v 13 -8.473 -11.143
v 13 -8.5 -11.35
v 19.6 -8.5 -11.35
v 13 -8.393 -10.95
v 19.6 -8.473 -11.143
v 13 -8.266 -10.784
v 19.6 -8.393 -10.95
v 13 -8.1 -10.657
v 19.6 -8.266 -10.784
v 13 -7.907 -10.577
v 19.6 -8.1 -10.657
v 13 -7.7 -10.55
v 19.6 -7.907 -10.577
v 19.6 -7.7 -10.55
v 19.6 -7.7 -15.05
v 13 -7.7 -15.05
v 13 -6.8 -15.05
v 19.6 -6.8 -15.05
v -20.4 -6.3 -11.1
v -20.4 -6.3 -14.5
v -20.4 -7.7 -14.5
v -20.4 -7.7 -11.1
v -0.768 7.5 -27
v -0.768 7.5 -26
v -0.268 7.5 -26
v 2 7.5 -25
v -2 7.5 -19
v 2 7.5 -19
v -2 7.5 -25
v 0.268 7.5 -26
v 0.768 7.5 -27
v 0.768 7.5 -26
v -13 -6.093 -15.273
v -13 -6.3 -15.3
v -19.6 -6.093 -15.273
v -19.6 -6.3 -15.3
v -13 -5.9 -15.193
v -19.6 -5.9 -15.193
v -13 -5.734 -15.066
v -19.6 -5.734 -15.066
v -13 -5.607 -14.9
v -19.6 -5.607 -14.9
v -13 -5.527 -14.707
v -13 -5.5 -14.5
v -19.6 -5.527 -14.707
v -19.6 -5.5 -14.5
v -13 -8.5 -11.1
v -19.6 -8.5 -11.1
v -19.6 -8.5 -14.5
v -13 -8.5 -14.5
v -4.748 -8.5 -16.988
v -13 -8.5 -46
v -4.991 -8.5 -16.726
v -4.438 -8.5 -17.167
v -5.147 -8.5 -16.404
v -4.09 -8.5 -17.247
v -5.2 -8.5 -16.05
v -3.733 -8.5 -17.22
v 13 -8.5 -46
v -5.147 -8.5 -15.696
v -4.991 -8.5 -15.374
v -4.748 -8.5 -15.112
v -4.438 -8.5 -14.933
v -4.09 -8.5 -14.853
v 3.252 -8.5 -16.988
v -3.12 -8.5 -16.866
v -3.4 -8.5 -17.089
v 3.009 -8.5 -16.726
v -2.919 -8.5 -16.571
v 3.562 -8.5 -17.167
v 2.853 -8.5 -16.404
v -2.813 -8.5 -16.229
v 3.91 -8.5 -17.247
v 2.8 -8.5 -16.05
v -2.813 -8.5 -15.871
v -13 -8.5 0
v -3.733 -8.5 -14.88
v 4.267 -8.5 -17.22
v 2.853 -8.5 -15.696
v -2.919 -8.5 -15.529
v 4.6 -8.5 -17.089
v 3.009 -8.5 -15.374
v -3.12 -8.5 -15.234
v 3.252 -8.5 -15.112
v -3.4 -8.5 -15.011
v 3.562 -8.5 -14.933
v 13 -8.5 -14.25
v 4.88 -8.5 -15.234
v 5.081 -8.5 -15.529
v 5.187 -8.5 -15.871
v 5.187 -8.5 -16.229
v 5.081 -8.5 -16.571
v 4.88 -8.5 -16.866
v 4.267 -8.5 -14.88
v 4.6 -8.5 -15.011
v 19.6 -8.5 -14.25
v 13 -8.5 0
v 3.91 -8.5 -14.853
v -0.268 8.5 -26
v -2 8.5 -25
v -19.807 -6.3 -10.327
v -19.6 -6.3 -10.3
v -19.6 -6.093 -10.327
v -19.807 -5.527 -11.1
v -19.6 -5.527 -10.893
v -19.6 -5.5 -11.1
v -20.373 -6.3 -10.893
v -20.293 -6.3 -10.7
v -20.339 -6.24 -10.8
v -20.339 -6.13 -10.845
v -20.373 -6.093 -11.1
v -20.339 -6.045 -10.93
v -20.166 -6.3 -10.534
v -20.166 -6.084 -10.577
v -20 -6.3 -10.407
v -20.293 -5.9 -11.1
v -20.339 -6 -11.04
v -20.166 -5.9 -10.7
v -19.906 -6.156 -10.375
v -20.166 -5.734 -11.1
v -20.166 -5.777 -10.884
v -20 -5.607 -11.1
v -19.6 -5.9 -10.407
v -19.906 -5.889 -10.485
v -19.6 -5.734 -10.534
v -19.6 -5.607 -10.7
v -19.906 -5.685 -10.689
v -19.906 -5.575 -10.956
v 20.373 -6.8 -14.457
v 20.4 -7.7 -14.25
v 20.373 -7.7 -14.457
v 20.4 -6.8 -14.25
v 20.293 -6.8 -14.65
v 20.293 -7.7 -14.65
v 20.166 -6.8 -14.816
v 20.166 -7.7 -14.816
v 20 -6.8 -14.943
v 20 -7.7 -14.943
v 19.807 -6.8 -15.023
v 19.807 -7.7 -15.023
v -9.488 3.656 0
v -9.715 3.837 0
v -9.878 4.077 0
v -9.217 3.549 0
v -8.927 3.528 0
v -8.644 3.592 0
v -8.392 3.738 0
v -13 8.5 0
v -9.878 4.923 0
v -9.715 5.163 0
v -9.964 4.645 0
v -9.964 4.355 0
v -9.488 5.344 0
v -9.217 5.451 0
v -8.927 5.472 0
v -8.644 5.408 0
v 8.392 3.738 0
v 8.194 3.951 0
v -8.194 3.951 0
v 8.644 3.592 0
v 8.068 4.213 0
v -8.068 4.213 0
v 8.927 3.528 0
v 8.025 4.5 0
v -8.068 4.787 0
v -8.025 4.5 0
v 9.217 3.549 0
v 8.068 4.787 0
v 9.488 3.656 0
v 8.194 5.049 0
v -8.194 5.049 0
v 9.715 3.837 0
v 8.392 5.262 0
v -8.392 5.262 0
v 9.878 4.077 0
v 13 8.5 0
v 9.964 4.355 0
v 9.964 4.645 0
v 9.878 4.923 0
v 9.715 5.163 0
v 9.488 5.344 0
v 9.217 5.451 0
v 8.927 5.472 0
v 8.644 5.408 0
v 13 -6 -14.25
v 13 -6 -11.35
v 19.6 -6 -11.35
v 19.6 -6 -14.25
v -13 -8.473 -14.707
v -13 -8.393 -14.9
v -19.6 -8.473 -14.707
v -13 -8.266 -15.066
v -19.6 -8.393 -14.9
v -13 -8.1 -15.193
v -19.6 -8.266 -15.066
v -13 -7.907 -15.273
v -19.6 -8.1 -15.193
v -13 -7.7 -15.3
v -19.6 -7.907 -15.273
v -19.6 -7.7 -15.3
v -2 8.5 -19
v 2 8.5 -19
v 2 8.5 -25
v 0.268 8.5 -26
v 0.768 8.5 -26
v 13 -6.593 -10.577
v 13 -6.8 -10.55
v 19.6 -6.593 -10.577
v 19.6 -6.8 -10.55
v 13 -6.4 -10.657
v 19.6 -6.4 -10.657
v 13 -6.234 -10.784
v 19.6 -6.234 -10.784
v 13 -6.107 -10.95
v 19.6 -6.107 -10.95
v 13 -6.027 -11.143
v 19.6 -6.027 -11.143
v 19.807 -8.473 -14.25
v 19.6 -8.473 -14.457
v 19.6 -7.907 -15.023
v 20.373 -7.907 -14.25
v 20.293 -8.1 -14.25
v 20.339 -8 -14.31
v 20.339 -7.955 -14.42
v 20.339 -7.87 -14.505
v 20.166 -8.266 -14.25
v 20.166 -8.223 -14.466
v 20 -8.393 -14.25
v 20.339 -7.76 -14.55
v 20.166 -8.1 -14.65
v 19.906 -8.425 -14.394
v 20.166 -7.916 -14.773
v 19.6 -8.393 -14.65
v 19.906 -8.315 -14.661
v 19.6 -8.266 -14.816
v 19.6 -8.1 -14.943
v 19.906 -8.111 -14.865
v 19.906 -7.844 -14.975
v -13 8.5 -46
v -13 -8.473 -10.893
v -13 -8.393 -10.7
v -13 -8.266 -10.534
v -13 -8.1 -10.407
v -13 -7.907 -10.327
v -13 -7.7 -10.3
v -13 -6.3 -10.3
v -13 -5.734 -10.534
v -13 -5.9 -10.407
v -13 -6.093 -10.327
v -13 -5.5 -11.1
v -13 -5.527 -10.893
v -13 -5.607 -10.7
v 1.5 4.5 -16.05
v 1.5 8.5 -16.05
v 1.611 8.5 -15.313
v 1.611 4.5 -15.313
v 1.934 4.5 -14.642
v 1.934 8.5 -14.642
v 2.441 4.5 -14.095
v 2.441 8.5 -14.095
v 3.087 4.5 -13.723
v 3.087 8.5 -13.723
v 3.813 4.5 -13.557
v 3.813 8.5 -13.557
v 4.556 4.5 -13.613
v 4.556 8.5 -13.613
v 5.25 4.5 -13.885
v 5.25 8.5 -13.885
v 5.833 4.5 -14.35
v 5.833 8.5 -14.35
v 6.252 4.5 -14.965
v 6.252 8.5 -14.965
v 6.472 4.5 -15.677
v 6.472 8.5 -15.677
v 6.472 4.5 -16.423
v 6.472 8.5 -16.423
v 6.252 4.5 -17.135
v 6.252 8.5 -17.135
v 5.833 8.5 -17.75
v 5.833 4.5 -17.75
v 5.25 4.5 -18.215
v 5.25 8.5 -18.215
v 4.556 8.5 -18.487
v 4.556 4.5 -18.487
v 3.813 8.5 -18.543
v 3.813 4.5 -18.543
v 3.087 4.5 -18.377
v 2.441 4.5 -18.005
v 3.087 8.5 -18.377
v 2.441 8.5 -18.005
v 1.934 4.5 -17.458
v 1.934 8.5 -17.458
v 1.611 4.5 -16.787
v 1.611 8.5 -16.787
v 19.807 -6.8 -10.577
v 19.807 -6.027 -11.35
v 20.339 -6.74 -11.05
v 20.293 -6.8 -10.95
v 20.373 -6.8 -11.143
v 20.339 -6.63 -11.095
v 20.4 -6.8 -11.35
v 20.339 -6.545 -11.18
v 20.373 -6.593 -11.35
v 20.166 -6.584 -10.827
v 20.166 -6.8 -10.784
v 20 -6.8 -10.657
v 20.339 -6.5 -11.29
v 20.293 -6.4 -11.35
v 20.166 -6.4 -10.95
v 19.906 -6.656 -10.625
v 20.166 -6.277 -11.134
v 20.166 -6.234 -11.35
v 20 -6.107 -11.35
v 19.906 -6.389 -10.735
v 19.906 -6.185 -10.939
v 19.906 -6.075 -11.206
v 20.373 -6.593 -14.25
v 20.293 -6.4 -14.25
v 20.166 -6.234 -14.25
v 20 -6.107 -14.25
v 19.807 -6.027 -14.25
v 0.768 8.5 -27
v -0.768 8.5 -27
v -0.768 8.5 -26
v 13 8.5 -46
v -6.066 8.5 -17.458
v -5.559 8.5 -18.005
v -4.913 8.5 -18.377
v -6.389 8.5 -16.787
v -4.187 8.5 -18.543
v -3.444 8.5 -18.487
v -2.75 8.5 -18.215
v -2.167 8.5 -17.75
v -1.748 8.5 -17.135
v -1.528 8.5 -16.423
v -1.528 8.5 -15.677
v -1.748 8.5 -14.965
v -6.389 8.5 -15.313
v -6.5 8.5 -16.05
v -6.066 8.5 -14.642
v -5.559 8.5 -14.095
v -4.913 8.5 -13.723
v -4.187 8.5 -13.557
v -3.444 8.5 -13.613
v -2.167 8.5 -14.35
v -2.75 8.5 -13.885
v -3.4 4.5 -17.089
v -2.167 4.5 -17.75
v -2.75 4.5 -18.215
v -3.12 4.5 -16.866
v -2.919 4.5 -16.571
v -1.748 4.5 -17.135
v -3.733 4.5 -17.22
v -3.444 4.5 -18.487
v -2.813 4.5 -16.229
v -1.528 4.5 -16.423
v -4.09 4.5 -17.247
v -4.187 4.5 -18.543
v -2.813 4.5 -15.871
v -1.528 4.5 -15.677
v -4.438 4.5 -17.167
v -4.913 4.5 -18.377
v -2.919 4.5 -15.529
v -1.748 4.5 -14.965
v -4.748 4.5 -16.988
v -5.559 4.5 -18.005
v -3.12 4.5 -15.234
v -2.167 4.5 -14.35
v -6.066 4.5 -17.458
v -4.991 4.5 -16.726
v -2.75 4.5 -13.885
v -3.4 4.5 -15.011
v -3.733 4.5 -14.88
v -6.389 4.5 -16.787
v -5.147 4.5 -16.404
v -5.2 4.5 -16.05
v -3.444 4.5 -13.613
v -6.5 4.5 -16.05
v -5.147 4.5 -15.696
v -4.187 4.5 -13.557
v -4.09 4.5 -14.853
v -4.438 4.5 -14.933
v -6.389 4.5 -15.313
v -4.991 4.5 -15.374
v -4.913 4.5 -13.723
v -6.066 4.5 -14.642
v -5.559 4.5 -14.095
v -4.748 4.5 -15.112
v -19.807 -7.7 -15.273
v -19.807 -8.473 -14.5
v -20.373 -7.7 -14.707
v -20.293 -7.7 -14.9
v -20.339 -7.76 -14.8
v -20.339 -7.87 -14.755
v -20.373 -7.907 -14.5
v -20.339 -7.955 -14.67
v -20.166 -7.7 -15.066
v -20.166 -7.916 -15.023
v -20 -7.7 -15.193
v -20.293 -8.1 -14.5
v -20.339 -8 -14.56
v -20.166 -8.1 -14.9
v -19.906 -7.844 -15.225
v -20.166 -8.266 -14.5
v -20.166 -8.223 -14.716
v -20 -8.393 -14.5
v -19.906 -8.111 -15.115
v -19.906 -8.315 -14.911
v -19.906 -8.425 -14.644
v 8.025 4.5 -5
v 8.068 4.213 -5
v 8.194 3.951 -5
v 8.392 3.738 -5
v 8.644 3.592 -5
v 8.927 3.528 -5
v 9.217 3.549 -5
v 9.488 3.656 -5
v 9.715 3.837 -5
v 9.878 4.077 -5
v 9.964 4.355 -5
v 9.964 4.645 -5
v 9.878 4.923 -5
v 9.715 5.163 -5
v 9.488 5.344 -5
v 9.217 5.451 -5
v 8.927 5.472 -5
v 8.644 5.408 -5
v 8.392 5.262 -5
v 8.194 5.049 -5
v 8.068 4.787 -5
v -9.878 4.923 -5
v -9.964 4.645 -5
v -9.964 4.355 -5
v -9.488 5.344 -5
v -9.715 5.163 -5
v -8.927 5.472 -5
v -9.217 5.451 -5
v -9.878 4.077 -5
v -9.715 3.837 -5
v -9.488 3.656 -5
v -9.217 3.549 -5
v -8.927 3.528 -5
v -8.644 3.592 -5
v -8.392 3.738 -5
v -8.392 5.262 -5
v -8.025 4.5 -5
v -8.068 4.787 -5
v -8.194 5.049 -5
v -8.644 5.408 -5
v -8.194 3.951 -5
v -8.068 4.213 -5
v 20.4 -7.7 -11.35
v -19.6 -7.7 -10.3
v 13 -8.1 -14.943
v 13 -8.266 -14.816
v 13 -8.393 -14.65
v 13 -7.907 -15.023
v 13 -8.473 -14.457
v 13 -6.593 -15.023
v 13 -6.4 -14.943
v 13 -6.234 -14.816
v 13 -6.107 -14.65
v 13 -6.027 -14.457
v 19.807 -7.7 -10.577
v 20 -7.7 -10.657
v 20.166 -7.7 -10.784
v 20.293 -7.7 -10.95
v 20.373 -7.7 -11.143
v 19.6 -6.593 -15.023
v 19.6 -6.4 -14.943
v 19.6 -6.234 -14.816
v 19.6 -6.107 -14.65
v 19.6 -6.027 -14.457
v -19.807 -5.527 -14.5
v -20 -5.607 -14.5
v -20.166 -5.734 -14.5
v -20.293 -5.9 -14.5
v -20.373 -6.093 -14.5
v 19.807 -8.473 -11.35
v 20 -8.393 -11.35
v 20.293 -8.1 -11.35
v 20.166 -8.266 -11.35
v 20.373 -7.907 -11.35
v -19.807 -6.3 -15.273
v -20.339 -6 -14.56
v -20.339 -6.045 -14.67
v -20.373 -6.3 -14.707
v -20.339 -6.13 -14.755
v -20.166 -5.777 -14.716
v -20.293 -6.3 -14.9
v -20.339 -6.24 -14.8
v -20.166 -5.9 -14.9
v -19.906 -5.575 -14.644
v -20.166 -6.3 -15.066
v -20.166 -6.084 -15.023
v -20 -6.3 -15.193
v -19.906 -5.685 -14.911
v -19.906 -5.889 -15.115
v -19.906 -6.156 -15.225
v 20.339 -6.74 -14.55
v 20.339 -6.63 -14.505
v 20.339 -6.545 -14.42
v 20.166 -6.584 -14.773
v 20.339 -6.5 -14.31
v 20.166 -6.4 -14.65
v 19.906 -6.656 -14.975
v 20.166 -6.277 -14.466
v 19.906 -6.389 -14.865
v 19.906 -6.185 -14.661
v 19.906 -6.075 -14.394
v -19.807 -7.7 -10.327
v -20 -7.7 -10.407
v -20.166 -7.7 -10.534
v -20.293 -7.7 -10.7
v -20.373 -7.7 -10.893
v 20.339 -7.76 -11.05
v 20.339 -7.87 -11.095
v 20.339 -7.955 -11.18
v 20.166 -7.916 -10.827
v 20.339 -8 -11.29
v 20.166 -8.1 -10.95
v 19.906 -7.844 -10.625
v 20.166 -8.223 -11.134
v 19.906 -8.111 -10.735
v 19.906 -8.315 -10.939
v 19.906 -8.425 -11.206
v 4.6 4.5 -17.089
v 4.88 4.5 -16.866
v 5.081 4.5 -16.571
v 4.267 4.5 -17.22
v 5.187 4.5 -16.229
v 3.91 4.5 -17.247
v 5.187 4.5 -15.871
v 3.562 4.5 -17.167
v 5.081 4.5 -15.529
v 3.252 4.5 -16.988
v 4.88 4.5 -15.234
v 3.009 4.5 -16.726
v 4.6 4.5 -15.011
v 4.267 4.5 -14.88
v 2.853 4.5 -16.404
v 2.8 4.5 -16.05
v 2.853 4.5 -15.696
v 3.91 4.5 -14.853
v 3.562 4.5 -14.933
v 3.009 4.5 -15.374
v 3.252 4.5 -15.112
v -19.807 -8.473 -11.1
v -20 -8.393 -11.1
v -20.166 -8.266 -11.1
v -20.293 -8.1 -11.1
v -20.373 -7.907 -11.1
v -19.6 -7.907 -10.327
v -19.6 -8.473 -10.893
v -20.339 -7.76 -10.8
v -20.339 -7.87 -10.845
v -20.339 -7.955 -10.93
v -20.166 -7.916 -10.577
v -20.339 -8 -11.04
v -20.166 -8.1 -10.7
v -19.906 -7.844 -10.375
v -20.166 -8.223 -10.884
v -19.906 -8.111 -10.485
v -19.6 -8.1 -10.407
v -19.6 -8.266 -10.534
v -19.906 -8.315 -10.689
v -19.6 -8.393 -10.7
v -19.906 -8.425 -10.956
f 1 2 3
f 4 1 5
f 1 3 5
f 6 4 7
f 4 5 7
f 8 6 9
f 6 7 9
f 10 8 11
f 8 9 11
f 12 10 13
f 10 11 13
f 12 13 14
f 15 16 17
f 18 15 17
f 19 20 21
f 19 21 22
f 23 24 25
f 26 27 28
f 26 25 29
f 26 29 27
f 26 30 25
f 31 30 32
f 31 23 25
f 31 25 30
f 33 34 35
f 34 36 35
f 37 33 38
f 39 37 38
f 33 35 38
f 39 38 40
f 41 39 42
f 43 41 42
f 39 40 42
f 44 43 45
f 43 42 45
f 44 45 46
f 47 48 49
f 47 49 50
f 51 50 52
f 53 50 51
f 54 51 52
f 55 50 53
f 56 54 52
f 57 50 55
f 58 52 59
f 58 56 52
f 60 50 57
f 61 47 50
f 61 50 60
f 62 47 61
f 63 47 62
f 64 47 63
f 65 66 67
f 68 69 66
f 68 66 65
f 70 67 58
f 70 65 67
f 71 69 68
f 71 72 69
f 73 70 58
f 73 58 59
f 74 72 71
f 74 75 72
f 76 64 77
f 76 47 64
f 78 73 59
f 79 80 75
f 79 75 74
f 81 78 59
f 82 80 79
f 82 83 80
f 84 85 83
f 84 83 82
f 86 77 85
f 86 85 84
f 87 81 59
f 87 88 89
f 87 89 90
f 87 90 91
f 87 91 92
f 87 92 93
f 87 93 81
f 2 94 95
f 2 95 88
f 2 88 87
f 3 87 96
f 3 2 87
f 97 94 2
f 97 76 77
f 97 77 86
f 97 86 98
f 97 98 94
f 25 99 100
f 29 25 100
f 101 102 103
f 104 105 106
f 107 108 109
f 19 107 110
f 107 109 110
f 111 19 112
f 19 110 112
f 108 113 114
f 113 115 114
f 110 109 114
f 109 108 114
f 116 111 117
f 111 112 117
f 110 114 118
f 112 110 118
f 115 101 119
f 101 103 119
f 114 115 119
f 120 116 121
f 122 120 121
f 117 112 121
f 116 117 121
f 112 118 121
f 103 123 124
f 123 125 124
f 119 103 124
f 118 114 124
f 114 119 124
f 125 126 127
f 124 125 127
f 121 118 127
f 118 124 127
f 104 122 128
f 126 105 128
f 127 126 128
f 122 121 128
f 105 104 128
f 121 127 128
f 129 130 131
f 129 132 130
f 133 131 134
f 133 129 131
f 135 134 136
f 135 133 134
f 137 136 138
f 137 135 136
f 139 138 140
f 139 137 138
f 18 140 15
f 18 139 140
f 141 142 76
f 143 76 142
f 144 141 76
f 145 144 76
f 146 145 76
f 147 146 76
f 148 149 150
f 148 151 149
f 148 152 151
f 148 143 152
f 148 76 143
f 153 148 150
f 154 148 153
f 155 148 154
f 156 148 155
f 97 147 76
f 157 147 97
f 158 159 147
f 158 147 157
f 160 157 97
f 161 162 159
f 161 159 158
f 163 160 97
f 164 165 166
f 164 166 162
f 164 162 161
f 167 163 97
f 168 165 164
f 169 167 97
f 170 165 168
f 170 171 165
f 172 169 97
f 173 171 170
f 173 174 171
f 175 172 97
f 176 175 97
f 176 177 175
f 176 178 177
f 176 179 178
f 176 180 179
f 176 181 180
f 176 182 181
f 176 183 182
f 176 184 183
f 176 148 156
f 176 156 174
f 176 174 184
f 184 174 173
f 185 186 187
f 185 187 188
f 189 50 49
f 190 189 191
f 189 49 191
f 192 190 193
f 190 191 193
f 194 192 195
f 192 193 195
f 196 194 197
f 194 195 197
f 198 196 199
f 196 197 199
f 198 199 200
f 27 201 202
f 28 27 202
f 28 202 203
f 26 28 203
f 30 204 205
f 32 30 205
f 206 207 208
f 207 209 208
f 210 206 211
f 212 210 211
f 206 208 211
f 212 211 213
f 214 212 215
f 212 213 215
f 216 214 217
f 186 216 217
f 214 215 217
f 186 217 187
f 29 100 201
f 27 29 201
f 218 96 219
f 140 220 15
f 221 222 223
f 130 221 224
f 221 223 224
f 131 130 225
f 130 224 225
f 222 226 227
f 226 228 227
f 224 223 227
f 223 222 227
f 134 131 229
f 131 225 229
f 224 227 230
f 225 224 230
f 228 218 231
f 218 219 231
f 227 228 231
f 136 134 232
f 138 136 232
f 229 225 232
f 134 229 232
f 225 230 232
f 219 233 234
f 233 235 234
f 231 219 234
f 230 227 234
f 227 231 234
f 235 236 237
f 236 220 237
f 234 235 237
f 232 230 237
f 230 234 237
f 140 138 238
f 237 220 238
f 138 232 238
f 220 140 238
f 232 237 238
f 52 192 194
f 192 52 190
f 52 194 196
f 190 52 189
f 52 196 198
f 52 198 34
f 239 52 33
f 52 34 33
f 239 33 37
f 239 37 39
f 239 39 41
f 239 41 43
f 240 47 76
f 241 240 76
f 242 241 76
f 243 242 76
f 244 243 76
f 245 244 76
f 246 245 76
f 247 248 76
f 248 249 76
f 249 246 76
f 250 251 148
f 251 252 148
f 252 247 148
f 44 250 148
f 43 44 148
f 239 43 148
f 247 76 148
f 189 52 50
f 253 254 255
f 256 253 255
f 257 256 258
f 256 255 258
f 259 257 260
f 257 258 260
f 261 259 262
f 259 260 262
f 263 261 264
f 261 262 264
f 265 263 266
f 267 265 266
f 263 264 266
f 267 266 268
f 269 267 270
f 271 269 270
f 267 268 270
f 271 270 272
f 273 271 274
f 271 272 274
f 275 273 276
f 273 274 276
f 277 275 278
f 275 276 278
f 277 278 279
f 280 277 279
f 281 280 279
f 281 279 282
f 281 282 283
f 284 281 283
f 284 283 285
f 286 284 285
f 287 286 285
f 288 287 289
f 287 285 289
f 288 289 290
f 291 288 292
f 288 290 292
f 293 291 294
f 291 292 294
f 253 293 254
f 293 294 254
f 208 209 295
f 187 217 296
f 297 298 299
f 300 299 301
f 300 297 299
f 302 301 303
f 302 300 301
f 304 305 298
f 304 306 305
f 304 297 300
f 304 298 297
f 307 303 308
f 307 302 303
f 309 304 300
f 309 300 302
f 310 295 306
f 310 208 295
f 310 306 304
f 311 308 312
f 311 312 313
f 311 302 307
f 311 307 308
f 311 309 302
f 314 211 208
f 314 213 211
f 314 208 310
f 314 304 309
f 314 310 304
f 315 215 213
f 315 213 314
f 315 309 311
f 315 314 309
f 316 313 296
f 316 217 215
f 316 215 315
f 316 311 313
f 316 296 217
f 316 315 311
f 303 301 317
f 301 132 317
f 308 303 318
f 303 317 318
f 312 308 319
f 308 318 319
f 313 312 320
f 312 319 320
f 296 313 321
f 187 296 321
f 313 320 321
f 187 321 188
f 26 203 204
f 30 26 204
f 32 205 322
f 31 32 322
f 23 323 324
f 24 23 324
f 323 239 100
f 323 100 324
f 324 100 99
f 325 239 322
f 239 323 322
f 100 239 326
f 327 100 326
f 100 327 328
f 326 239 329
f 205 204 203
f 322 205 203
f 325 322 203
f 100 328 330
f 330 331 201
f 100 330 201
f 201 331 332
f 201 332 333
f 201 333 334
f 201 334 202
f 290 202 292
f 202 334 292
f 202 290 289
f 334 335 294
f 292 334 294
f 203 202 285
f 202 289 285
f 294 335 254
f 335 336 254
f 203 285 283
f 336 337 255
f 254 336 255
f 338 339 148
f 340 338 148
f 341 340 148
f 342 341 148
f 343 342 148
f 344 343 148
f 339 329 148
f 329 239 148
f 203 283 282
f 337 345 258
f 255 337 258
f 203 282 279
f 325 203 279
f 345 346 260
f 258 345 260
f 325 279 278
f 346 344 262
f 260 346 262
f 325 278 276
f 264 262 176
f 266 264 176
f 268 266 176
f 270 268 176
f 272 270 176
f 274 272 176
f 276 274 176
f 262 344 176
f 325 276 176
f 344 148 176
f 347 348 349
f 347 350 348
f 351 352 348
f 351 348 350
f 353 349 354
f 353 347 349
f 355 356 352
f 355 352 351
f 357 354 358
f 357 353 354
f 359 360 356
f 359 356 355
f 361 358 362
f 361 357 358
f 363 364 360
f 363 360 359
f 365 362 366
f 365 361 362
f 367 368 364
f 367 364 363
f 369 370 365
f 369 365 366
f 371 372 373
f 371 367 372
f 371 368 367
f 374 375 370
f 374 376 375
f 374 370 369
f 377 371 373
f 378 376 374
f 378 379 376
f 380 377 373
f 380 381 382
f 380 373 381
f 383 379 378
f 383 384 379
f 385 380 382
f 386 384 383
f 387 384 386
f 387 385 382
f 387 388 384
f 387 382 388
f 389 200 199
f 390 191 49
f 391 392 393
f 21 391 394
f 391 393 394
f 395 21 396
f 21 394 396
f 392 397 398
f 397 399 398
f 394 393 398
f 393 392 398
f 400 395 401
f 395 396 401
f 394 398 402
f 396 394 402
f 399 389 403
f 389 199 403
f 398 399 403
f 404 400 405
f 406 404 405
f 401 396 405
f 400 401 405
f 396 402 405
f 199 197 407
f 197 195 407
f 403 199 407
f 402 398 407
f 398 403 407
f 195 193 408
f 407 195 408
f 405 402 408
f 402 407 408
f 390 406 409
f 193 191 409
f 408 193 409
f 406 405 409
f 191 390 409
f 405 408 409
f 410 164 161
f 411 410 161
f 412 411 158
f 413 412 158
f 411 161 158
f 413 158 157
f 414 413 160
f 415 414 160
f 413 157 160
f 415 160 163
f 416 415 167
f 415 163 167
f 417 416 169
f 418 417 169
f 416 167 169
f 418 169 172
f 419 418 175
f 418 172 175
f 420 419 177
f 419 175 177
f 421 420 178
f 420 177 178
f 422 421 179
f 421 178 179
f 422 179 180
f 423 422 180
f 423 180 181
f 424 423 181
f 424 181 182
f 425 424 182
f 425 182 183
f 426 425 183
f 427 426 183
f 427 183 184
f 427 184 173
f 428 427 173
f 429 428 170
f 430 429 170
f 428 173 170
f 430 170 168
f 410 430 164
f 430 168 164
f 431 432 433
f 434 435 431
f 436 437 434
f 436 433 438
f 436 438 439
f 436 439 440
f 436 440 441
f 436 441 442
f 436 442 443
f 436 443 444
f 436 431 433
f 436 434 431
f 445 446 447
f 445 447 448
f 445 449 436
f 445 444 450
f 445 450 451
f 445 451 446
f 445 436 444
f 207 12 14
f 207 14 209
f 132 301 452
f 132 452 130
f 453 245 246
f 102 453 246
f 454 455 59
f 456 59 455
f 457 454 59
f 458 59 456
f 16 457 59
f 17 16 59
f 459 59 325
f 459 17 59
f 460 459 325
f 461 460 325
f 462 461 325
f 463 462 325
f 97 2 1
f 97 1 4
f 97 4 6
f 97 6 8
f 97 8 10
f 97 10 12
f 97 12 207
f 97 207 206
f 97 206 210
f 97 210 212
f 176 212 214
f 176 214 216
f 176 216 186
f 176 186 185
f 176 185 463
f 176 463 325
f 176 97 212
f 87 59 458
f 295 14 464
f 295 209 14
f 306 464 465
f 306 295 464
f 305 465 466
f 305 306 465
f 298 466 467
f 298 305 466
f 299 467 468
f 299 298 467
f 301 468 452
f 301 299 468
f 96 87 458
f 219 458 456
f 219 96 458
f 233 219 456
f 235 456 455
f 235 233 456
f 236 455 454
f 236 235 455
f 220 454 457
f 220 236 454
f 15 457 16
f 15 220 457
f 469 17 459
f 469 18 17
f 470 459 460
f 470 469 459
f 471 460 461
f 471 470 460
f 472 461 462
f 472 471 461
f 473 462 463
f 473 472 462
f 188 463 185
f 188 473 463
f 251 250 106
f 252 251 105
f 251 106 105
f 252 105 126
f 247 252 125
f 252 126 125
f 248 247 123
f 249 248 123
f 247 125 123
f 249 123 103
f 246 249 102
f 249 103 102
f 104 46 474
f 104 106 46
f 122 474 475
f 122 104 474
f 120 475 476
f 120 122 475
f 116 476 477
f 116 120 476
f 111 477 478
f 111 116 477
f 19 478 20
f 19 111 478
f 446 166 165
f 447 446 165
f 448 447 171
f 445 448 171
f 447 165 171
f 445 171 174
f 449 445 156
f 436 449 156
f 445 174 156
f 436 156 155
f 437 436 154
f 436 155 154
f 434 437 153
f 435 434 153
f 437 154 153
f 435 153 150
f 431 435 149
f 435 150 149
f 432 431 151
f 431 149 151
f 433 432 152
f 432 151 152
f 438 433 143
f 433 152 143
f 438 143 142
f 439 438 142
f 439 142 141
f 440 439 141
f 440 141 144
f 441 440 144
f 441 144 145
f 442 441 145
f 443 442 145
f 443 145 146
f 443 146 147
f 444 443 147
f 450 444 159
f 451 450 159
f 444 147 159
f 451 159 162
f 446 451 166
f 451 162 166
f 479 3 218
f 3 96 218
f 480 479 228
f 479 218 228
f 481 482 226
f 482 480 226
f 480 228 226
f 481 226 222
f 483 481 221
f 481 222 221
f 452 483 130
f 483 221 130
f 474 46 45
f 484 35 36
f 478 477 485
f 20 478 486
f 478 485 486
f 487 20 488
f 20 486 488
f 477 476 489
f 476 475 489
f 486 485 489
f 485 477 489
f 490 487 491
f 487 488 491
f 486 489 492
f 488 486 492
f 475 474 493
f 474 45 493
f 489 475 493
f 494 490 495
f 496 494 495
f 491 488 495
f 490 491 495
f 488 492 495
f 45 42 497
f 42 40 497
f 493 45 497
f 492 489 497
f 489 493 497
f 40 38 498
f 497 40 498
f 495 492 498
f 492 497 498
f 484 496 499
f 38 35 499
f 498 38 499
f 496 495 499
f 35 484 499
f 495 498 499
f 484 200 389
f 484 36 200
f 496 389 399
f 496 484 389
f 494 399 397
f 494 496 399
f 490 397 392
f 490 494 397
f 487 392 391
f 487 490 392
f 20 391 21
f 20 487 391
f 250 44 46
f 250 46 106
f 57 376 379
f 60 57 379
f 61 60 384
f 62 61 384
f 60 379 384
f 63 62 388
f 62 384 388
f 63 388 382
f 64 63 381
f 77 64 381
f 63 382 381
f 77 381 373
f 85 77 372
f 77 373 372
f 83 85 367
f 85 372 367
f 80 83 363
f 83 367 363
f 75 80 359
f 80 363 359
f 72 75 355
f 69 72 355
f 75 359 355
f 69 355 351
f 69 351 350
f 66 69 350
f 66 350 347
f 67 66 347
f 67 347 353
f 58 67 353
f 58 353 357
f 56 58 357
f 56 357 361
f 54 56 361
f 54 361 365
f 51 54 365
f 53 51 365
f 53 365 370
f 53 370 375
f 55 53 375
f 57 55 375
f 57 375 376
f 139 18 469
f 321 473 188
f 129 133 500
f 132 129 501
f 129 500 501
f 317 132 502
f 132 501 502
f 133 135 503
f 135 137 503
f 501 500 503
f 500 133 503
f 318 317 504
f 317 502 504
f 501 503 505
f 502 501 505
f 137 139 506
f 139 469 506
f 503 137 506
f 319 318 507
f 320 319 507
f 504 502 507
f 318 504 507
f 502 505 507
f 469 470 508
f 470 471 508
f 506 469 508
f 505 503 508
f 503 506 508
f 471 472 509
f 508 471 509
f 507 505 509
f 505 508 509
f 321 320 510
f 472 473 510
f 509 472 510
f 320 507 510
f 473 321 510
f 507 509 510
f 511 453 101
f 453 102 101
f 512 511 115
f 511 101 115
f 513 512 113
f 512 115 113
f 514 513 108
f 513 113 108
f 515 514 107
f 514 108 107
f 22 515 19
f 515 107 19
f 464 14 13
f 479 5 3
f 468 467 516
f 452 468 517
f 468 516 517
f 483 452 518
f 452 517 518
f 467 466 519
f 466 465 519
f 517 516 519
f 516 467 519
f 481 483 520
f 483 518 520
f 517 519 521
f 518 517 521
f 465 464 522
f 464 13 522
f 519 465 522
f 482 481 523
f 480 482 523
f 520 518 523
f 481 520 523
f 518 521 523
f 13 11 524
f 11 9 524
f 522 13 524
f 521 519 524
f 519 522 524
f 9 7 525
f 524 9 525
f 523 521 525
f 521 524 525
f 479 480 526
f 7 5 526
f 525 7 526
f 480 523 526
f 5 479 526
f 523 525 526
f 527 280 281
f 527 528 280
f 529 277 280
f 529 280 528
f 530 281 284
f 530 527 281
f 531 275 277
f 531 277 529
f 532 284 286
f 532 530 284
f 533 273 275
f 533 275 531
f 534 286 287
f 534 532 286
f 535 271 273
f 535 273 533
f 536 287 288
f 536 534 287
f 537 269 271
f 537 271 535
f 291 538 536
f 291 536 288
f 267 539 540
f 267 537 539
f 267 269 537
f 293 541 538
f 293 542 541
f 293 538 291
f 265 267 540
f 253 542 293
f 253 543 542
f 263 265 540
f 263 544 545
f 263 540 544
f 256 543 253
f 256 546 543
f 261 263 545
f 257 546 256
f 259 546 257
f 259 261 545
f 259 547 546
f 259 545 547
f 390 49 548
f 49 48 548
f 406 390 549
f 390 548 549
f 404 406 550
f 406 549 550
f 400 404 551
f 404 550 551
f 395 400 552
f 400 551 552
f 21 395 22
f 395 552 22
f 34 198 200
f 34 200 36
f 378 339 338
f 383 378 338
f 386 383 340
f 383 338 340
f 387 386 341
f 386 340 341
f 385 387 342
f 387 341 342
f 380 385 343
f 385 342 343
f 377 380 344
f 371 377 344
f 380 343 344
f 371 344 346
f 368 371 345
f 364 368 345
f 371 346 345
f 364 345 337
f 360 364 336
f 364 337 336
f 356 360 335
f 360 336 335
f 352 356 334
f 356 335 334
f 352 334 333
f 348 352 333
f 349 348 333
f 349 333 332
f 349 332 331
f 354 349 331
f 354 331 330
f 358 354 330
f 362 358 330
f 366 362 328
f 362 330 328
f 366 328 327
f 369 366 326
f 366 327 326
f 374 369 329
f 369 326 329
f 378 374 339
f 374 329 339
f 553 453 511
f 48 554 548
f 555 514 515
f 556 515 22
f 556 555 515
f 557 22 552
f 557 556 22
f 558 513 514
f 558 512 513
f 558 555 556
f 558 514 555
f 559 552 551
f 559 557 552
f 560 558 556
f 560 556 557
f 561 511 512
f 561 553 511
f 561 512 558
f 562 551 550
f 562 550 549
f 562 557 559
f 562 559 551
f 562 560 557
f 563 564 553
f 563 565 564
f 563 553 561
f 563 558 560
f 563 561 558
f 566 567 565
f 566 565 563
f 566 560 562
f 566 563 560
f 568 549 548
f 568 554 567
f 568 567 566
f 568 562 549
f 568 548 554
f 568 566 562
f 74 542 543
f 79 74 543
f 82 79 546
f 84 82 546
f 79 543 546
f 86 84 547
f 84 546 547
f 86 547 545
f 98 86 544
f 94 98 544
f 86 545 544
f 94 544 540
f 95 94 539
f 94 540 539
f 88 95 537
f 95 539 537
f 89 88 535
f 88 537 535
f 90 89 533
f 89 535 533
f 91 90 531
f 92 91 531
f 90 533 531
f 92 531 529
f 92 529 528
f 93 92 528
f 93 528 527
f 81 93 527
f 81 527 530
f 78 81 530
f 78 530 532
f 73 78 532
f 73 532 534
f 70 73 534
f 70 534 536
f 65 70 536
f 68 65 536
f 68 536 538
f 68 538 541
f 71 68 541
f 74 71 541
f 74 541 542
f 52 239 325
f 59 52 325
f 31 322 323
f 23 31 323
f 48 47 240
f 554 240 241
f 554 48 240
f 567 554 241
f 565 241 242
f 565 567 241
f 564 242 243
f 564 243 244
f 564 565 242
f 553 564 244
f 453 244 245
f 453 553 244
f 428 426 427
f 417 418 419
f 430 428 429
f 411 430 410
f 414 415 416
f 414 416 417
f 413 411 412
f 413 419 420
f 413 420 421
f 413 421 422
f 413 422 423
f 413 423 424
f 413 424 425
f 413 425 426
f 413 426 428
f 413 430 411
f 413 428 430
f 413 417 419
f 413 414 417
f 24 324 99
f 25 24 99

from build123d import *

# Parameters (mm, degrees)
SKETCH_1_W          = 26
SKETCH_1_H          = 17
EXTRUDE_1_DEPTH     = 46
SKETCH_2_W          = 4.5
SKETCH_2_H          = 2.5
EXTRUDE_2_DEPTH     = 7.4
SKETCH_4_W          = 5
SKETCH_4_H          = 3
EXTRUDE_3_DEPTH     = 7.4
SKETCH_5_R          = 1.2
CUT_EXTRUDE_1_DEPTH = 54.114593098
CUT_EXTRUDE_2_DEPTH = 1
SKETCH_8_R          = 2.5
CUT_EXTRUDE_3_DEPTH = 4
SKETCH_9_R          = 0.975
CUT_EXTRUDE_4_DEPTH = 5
FILLET_1_R          = 0.8


with BuildPart() as part:
    # ｽｹｯﾁ1 → ﾎﾞｽ - 押し出し1 (new body)
    with BuildSketch(Plane.XY):
        Rectangle(SKETCH_1_W, SKETCH_1_H)
    extrude(amount=-EXTRUDE_1_DEPTH)

    # ｽｹｯﾁ2 → ﾎﾞｽ - 押し出し2 (add)
    with BuildSketch(Plane(origin=(13, 0, 0), x_dir=(0, 0, -1), z_dir=(1, 0, 0))):
        with Locations((12.8, -7.25)):
            Rectangle(SKETCH_2_W, SKETCH_2_H)
    extrude(amount=EXTRUDE_2_DEPTH)

    # ｽｹｯﾁ4 → ﾎﾞｽ - 押し出し3 (add)
    with BuildSketch(Plane.ZY.offset(13)):
        with Locations((-12.8, -7)):
            Rectangle(SKETCH_4_W, SKETCH_4_H)
    extrude(amount=EXTRUDE_3_DEPTH)

    # ｽｹｯﾁ5 → ｶｯﾄ - 押し出し1 (cut, through all)
    with BuildSketch(Plane(origin=(0, 8.5, 0), x_dir=(1, 0, 0), z_dir=(0, 1, 0))):
        with Locations(Location((4, 16.05, 0), (0, 0, 180))):
            Circle(SKETCH_5_R)
        with Locations(Location((-4, 16.05, 0), (0, 0, 180))):
            Circle(SKETCH_5_R)
    extrude(amount=-CUT_EXTRUDE_1_DEPTH, mode=Mode.SUBTRACT)

    # ｽｹｯﾁ6 → ｶｯﾄ - 押し出し2 (cut)
    with BuildSketch(Plane(origin=(0, 8.5, 0), x_dir=(1, 0, 0), z_dir=(0, 1, 0))):
        Polygon((-2, 19), (2, 19), (2, 25), (0.267949192, 26), (0.767949192, 26), (0.767949192, 27), (-0.767949192, 27), (-0.767949192, 26), (-0.267949192, 26), (-2, 25), align=None)
    extrude(amount=-CUT_EXTRUDE_2_DEPTH, mode=Mode.SUBTRACT)

    # ｽｹｯﾁ8 → ｶｯﾄ - 押し出し3 (cut)
    with BuildSketch(Plane(origin=(0, 8.5, 0), x_dir=(1, 0, 0), z_dir=(0, 1, 0))):
        with Locations(Location((-4, 16.05, 0), (0, 0, 180))):
            Circle(SKETCH_8_R)
        with Locations(Location((4, 16.05, 0), (0, 0, 180))):
            Circle(SKETCH_8_R)
    extrude(amount=-CUT_EXTRUDE_3_DEPTH, mode=Mode.SUBTRACT)

    # ｽｹｯﾁ9 → ｶｯﾄ - 押し出し4 (cut)
    with BuildSketch(Plane.XY):
        with Locations((-9, 4.5)):
            Circle(SKETCH_9_R)
        with Locations(Location((9, 4.5, 0), (0, 0, 180))):
            Circle(SKETCH_9_R)
    extrude(amount=-CUT_EXTRUDE_4_DEPTH, mode=Mode.SUBTRACT)

    # ﾌｨﾚｯﾄ1
    fillet_1_edges = [part.edges().sort_by_distance(p)[0] for p in [
        (16.7, -6, -10.55),
        (16.7, -8.5, -10.55),
        (16.7, -8.5, -15.05),
        (16.7, -6, -15.05),
        (20.4, -7.25, -10.55),
        (20.4, -8.5, -12.8),
        (20.4, -7.25, -15.05),
        (20.4, -6, -12.8),
        (-16.7, -8.5, -10.3),
        (-16.7, -5.5, -10.3),
        (-16.7, -5.5, -15.3),
        (-16.7, -8.5, -15.3),
        (-20.4, -7, -10.3),
        (-20.4, -5.5, -12.8),
        (-20.4, -7, -15.3),
        (-20.4, -8.5, -12.8),
    ]]
    fillet(fillet_1_edges, radius=FILLET_1_R)


solid = part.part
